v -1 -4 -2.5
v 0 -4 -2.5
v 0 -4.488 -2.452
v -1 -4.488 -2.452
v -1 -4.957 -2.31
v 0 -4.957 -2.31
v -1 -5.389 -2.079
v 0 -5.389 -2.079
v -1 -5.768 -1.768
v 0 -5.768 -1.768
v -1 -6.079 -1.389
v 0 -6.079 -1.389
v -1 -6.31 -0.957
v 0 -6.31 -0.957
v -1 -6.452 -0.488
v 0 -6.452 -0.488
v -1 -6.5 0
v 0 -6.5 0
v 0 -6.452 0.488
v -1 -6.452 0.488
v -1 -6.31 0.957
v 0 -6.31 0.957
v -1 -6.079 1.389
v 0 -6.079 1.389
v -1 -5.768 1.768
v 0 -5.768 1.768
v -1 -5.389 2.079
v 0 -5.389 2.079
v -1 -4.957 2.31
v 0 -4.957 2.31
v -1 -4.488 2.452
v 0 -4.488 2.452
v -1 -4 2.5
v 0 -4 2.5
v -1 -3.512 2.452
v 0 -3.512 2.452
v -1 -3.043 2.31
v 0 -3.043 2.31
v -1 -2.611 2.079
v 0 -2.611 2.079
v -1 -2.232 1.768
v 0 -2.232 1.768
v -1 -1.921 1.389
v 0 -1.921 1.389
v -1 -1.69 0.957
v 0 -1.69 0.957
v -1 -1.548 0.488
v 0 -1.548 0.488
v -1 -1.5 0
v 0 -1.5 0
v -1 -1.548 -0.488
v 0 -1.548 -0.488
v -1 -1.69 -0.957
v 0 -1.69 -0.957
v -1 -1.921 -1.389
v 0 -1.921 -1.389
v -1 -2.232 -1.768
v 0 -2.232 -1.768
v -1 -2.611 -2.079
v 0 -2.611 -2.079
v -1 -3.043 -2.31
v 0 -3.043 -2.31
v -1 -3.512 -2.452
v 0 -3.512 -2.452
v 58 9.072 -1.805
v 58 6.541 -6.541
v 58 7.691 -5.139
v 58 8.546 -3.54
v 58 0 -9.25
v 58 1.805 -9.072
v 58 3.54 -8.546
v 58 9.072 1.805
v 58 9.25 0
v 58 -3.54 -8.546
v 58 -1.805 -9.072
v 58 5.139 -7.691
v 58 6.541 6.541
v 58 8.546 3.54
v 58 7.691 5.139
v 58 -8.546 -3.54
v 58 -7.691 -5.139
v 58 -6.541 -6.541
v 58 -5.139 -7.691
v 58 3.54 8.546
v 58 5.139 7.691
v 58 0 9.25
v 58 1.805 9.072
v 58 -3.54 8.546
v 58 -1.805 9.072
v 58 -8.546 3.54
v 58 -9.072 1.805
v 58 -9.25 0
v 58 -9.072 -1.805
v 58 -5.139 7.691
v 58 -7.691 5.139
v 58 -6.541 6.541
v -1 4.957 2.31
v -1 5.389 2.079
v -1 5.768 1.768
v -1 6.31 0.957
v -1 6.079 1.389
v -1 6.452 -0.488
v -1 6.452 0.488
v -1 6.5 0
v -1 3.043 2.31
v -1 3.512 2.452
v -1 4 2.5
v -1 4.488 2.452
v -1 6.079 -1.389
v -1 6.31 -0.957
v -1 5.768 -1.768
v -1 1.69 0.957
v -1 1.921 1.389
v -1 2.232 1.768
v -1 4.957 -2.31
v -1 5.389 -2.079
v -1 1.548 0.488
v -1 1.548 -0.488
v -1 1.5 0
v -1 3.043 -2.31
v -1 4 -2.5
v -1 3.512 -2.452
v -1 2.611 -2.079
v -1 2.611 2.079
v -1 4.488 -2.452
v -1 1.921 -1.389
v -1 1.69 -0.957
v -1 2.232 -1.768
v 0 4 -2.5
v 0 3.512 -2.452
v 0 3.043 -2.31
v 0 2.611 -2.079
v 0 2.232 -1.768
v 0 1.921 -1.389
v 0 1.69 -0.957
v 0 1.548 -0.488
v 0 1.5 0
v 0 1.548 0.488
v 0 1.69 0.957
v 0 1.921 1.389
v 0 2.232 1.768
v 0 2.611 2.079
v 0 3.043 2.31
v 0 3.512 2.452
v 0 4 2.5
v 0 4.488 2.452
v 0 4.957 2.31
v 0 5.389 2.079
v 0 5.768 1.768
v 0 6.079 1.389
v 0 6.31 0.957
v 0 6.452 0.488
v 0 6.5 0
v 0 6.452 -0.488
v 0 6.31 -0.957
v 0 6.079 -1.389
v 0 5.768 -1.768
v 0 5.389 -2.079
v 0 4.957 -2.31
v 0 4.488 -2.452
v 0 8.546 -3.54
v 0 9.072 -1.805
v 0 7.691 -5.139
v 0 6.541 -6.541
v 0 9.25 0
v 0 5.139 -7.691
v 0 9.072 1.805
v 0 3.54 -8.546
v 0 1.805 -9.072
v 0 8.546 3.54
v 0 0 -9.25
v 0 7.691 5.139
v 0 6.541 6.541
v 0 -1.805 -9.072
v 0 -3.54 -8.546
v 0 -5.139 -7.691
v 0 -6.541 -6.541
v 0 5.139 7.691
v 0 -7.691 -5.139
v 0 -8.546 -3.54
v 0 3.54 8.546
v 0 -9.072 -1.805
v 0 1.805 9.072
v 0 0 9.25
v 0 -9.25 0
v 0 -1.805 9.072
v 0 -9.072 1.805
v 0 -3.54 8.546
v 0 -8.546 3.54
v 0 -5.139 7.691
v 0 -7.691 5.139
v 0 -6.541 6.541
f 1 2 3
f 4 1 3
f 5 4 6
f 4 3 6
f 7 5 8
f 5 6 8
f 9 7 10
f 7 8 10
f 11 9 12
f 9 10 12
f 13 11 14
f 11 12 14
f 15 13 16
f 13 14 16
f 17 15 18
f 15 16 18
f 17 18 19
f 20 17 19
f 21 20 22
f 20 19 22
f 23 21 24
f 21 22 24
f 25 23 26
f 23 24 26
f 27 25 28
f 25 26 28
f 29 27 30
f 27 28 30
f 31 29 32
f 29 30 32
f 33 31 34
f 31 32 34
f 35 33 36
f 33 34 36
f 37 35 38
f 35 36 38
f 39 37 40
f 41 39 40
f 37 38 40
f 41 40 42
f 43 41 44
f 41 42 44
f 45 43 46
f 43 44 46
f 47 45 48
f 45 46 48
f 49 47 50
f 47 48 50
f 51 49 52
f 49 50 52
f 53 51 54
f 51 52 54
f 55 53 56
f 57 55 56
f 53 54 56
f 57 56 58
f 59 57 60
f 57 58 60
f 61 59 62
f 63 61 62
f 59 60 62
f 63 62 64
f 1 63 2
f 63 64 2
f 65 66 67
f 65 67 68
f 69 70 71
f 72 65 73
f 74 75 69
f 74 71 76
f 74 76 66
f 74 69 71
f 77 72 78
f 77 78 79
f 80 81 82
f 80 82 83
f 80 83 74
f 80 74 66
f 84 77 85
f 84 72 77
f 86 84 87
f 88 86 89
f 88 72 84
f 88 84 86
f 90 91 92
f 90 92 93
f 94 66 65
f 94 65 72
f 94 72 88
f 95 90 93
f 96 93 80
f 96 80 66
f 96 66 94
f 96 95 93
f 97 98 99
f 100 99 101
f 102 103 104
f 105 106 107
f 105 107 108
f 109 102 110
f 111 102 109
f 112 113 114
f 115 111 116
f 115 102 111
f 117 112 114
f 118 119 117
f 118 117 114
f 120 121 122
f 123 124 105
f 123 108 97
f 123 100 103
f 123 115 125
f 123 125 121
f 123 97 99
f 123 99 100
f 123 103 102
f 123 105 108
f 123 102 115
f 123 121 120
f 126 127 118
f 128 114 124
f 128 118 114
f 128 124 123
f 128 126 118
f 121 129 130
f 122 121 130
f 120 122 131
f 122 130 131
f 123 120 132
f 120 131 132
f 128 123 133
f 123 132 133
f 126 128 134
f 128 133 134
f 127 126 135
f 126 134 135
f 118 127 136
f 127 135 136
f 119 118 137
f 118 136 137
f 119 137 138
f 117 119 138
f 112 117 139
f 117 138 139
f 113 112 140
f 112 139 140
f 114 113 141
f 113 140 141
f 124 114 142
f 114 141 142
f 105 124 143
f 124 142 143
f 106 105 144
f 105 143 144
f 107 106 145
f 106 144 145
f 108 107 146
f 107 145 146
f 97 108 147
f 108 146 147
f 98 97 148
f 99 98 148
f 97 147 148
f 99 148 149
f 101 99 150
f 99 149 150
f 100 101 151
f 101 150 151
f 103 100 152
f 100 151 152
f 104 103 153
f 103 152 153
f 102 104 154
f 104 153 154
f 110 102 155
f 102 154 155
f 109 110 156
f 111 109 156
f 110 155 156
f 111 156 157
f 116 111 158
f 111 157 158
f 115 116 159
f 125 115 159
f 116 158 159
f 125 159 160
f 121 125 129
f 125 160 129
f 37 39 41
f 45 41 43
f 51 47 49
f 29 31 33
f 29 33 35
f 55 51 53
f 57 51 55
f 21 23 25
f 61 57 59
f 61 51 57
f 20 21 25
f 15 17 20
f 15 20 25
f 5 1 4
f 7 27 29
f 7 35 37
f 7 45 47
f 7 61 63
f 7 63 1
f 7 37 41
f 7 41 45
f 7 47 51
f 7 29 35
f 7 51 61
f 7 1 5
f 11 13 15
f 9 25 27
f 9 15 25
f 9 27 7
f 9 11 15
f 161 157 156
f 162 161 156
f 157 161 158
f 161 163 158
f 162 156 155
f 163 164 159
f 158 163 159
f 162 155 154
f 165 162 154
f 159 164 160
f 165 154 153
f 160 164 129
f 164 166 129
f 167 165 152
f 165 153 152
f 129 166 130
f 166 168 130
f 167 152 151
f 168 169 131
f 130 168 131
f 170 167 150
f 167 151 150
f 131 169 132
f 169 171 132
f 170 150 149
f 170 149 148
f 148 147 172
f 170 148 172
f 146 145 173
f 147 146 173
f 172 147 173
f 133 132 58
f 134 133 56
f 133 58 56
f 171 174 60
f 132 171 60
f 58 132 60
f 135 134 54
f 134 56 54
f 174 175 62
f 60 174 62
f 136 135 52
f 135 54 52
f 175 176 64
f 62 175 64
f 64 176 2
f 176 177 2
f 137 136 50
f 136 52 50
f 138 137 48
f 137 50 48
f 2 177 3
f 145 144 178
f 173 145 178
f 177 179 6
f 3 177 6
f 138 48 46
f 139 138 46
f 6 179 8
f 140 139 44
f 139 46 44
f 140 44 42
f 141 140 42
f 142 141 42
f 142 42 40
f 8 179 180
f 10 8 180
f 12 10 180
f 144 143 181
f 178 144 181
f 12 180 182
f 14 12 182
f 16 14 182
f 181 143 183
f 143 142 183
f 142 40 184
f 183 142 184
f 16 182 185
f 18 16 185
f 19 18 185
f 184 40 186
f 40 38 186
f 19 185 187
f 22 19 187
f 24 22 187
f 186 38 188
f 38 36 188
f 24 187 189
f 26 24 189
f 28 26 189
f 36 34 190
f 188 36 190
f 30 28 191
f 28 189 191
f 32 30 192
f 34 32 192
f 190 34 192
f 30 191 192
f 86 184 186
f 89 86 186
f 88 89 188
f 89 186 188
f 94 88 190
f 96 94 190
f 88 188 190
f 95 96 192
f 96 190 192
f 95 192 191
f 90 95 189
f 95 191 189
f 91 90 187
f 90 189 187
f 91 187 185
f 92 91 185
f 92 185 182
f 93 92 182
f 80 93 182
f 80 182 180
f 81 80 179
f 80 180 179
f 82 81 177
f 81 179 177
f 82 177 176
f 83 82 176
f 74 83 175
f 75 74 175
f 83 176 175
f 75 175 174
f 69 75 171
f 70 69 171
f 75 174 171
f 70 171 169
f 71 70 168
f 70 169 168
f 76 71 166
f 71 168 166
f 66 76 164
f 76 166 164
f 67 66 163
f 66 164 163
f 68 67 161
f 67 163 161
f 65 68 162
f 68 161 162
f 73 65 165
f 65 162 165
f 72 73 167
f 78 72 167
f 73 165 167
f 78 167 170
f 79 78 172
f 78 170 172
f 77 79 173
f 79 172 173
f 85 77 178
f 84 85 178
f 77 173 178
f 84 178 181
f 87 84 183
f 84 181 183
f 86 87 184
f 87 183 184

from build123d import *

# Parameters (mm, degrees)
SKETCH1_R           = 9.25
BOSS_EXTRUDE1_DEPTH = 58
SKETCH2_R           = 2.5
BOSS_EXTRUDE2_DEPTH = 1


with BuildPart() as part:
    # Sketch1 → Boss-Extrude1 (new body)
    with BuildSketch(Plane(origin=(0, 0, 0), x_dir=(0, 0, -1), z_dir=(1, 0, 0))):
        with Locations(Location((0, 0, 0), (0, 0, 180))):
            Circle(SKETCH1_R)
    extrude(amount=BOSS_EXTRUDE1_DEPTH)

    # Sketch2 → Boss-Extrude2 (add)
    with BuildSketch(Plane.ZY):
        with Locations(Location((0, 4, 0), (0, 0, 180))):
            Circle(SKETCH2_R)
        with Locations(Location((0, -4, 0), (0, 0, 180))):
            Circle(SKETCH2_R)
    extrude(amount=BOSS_EXTRUDE2_DEPTH)


solid = part.part
